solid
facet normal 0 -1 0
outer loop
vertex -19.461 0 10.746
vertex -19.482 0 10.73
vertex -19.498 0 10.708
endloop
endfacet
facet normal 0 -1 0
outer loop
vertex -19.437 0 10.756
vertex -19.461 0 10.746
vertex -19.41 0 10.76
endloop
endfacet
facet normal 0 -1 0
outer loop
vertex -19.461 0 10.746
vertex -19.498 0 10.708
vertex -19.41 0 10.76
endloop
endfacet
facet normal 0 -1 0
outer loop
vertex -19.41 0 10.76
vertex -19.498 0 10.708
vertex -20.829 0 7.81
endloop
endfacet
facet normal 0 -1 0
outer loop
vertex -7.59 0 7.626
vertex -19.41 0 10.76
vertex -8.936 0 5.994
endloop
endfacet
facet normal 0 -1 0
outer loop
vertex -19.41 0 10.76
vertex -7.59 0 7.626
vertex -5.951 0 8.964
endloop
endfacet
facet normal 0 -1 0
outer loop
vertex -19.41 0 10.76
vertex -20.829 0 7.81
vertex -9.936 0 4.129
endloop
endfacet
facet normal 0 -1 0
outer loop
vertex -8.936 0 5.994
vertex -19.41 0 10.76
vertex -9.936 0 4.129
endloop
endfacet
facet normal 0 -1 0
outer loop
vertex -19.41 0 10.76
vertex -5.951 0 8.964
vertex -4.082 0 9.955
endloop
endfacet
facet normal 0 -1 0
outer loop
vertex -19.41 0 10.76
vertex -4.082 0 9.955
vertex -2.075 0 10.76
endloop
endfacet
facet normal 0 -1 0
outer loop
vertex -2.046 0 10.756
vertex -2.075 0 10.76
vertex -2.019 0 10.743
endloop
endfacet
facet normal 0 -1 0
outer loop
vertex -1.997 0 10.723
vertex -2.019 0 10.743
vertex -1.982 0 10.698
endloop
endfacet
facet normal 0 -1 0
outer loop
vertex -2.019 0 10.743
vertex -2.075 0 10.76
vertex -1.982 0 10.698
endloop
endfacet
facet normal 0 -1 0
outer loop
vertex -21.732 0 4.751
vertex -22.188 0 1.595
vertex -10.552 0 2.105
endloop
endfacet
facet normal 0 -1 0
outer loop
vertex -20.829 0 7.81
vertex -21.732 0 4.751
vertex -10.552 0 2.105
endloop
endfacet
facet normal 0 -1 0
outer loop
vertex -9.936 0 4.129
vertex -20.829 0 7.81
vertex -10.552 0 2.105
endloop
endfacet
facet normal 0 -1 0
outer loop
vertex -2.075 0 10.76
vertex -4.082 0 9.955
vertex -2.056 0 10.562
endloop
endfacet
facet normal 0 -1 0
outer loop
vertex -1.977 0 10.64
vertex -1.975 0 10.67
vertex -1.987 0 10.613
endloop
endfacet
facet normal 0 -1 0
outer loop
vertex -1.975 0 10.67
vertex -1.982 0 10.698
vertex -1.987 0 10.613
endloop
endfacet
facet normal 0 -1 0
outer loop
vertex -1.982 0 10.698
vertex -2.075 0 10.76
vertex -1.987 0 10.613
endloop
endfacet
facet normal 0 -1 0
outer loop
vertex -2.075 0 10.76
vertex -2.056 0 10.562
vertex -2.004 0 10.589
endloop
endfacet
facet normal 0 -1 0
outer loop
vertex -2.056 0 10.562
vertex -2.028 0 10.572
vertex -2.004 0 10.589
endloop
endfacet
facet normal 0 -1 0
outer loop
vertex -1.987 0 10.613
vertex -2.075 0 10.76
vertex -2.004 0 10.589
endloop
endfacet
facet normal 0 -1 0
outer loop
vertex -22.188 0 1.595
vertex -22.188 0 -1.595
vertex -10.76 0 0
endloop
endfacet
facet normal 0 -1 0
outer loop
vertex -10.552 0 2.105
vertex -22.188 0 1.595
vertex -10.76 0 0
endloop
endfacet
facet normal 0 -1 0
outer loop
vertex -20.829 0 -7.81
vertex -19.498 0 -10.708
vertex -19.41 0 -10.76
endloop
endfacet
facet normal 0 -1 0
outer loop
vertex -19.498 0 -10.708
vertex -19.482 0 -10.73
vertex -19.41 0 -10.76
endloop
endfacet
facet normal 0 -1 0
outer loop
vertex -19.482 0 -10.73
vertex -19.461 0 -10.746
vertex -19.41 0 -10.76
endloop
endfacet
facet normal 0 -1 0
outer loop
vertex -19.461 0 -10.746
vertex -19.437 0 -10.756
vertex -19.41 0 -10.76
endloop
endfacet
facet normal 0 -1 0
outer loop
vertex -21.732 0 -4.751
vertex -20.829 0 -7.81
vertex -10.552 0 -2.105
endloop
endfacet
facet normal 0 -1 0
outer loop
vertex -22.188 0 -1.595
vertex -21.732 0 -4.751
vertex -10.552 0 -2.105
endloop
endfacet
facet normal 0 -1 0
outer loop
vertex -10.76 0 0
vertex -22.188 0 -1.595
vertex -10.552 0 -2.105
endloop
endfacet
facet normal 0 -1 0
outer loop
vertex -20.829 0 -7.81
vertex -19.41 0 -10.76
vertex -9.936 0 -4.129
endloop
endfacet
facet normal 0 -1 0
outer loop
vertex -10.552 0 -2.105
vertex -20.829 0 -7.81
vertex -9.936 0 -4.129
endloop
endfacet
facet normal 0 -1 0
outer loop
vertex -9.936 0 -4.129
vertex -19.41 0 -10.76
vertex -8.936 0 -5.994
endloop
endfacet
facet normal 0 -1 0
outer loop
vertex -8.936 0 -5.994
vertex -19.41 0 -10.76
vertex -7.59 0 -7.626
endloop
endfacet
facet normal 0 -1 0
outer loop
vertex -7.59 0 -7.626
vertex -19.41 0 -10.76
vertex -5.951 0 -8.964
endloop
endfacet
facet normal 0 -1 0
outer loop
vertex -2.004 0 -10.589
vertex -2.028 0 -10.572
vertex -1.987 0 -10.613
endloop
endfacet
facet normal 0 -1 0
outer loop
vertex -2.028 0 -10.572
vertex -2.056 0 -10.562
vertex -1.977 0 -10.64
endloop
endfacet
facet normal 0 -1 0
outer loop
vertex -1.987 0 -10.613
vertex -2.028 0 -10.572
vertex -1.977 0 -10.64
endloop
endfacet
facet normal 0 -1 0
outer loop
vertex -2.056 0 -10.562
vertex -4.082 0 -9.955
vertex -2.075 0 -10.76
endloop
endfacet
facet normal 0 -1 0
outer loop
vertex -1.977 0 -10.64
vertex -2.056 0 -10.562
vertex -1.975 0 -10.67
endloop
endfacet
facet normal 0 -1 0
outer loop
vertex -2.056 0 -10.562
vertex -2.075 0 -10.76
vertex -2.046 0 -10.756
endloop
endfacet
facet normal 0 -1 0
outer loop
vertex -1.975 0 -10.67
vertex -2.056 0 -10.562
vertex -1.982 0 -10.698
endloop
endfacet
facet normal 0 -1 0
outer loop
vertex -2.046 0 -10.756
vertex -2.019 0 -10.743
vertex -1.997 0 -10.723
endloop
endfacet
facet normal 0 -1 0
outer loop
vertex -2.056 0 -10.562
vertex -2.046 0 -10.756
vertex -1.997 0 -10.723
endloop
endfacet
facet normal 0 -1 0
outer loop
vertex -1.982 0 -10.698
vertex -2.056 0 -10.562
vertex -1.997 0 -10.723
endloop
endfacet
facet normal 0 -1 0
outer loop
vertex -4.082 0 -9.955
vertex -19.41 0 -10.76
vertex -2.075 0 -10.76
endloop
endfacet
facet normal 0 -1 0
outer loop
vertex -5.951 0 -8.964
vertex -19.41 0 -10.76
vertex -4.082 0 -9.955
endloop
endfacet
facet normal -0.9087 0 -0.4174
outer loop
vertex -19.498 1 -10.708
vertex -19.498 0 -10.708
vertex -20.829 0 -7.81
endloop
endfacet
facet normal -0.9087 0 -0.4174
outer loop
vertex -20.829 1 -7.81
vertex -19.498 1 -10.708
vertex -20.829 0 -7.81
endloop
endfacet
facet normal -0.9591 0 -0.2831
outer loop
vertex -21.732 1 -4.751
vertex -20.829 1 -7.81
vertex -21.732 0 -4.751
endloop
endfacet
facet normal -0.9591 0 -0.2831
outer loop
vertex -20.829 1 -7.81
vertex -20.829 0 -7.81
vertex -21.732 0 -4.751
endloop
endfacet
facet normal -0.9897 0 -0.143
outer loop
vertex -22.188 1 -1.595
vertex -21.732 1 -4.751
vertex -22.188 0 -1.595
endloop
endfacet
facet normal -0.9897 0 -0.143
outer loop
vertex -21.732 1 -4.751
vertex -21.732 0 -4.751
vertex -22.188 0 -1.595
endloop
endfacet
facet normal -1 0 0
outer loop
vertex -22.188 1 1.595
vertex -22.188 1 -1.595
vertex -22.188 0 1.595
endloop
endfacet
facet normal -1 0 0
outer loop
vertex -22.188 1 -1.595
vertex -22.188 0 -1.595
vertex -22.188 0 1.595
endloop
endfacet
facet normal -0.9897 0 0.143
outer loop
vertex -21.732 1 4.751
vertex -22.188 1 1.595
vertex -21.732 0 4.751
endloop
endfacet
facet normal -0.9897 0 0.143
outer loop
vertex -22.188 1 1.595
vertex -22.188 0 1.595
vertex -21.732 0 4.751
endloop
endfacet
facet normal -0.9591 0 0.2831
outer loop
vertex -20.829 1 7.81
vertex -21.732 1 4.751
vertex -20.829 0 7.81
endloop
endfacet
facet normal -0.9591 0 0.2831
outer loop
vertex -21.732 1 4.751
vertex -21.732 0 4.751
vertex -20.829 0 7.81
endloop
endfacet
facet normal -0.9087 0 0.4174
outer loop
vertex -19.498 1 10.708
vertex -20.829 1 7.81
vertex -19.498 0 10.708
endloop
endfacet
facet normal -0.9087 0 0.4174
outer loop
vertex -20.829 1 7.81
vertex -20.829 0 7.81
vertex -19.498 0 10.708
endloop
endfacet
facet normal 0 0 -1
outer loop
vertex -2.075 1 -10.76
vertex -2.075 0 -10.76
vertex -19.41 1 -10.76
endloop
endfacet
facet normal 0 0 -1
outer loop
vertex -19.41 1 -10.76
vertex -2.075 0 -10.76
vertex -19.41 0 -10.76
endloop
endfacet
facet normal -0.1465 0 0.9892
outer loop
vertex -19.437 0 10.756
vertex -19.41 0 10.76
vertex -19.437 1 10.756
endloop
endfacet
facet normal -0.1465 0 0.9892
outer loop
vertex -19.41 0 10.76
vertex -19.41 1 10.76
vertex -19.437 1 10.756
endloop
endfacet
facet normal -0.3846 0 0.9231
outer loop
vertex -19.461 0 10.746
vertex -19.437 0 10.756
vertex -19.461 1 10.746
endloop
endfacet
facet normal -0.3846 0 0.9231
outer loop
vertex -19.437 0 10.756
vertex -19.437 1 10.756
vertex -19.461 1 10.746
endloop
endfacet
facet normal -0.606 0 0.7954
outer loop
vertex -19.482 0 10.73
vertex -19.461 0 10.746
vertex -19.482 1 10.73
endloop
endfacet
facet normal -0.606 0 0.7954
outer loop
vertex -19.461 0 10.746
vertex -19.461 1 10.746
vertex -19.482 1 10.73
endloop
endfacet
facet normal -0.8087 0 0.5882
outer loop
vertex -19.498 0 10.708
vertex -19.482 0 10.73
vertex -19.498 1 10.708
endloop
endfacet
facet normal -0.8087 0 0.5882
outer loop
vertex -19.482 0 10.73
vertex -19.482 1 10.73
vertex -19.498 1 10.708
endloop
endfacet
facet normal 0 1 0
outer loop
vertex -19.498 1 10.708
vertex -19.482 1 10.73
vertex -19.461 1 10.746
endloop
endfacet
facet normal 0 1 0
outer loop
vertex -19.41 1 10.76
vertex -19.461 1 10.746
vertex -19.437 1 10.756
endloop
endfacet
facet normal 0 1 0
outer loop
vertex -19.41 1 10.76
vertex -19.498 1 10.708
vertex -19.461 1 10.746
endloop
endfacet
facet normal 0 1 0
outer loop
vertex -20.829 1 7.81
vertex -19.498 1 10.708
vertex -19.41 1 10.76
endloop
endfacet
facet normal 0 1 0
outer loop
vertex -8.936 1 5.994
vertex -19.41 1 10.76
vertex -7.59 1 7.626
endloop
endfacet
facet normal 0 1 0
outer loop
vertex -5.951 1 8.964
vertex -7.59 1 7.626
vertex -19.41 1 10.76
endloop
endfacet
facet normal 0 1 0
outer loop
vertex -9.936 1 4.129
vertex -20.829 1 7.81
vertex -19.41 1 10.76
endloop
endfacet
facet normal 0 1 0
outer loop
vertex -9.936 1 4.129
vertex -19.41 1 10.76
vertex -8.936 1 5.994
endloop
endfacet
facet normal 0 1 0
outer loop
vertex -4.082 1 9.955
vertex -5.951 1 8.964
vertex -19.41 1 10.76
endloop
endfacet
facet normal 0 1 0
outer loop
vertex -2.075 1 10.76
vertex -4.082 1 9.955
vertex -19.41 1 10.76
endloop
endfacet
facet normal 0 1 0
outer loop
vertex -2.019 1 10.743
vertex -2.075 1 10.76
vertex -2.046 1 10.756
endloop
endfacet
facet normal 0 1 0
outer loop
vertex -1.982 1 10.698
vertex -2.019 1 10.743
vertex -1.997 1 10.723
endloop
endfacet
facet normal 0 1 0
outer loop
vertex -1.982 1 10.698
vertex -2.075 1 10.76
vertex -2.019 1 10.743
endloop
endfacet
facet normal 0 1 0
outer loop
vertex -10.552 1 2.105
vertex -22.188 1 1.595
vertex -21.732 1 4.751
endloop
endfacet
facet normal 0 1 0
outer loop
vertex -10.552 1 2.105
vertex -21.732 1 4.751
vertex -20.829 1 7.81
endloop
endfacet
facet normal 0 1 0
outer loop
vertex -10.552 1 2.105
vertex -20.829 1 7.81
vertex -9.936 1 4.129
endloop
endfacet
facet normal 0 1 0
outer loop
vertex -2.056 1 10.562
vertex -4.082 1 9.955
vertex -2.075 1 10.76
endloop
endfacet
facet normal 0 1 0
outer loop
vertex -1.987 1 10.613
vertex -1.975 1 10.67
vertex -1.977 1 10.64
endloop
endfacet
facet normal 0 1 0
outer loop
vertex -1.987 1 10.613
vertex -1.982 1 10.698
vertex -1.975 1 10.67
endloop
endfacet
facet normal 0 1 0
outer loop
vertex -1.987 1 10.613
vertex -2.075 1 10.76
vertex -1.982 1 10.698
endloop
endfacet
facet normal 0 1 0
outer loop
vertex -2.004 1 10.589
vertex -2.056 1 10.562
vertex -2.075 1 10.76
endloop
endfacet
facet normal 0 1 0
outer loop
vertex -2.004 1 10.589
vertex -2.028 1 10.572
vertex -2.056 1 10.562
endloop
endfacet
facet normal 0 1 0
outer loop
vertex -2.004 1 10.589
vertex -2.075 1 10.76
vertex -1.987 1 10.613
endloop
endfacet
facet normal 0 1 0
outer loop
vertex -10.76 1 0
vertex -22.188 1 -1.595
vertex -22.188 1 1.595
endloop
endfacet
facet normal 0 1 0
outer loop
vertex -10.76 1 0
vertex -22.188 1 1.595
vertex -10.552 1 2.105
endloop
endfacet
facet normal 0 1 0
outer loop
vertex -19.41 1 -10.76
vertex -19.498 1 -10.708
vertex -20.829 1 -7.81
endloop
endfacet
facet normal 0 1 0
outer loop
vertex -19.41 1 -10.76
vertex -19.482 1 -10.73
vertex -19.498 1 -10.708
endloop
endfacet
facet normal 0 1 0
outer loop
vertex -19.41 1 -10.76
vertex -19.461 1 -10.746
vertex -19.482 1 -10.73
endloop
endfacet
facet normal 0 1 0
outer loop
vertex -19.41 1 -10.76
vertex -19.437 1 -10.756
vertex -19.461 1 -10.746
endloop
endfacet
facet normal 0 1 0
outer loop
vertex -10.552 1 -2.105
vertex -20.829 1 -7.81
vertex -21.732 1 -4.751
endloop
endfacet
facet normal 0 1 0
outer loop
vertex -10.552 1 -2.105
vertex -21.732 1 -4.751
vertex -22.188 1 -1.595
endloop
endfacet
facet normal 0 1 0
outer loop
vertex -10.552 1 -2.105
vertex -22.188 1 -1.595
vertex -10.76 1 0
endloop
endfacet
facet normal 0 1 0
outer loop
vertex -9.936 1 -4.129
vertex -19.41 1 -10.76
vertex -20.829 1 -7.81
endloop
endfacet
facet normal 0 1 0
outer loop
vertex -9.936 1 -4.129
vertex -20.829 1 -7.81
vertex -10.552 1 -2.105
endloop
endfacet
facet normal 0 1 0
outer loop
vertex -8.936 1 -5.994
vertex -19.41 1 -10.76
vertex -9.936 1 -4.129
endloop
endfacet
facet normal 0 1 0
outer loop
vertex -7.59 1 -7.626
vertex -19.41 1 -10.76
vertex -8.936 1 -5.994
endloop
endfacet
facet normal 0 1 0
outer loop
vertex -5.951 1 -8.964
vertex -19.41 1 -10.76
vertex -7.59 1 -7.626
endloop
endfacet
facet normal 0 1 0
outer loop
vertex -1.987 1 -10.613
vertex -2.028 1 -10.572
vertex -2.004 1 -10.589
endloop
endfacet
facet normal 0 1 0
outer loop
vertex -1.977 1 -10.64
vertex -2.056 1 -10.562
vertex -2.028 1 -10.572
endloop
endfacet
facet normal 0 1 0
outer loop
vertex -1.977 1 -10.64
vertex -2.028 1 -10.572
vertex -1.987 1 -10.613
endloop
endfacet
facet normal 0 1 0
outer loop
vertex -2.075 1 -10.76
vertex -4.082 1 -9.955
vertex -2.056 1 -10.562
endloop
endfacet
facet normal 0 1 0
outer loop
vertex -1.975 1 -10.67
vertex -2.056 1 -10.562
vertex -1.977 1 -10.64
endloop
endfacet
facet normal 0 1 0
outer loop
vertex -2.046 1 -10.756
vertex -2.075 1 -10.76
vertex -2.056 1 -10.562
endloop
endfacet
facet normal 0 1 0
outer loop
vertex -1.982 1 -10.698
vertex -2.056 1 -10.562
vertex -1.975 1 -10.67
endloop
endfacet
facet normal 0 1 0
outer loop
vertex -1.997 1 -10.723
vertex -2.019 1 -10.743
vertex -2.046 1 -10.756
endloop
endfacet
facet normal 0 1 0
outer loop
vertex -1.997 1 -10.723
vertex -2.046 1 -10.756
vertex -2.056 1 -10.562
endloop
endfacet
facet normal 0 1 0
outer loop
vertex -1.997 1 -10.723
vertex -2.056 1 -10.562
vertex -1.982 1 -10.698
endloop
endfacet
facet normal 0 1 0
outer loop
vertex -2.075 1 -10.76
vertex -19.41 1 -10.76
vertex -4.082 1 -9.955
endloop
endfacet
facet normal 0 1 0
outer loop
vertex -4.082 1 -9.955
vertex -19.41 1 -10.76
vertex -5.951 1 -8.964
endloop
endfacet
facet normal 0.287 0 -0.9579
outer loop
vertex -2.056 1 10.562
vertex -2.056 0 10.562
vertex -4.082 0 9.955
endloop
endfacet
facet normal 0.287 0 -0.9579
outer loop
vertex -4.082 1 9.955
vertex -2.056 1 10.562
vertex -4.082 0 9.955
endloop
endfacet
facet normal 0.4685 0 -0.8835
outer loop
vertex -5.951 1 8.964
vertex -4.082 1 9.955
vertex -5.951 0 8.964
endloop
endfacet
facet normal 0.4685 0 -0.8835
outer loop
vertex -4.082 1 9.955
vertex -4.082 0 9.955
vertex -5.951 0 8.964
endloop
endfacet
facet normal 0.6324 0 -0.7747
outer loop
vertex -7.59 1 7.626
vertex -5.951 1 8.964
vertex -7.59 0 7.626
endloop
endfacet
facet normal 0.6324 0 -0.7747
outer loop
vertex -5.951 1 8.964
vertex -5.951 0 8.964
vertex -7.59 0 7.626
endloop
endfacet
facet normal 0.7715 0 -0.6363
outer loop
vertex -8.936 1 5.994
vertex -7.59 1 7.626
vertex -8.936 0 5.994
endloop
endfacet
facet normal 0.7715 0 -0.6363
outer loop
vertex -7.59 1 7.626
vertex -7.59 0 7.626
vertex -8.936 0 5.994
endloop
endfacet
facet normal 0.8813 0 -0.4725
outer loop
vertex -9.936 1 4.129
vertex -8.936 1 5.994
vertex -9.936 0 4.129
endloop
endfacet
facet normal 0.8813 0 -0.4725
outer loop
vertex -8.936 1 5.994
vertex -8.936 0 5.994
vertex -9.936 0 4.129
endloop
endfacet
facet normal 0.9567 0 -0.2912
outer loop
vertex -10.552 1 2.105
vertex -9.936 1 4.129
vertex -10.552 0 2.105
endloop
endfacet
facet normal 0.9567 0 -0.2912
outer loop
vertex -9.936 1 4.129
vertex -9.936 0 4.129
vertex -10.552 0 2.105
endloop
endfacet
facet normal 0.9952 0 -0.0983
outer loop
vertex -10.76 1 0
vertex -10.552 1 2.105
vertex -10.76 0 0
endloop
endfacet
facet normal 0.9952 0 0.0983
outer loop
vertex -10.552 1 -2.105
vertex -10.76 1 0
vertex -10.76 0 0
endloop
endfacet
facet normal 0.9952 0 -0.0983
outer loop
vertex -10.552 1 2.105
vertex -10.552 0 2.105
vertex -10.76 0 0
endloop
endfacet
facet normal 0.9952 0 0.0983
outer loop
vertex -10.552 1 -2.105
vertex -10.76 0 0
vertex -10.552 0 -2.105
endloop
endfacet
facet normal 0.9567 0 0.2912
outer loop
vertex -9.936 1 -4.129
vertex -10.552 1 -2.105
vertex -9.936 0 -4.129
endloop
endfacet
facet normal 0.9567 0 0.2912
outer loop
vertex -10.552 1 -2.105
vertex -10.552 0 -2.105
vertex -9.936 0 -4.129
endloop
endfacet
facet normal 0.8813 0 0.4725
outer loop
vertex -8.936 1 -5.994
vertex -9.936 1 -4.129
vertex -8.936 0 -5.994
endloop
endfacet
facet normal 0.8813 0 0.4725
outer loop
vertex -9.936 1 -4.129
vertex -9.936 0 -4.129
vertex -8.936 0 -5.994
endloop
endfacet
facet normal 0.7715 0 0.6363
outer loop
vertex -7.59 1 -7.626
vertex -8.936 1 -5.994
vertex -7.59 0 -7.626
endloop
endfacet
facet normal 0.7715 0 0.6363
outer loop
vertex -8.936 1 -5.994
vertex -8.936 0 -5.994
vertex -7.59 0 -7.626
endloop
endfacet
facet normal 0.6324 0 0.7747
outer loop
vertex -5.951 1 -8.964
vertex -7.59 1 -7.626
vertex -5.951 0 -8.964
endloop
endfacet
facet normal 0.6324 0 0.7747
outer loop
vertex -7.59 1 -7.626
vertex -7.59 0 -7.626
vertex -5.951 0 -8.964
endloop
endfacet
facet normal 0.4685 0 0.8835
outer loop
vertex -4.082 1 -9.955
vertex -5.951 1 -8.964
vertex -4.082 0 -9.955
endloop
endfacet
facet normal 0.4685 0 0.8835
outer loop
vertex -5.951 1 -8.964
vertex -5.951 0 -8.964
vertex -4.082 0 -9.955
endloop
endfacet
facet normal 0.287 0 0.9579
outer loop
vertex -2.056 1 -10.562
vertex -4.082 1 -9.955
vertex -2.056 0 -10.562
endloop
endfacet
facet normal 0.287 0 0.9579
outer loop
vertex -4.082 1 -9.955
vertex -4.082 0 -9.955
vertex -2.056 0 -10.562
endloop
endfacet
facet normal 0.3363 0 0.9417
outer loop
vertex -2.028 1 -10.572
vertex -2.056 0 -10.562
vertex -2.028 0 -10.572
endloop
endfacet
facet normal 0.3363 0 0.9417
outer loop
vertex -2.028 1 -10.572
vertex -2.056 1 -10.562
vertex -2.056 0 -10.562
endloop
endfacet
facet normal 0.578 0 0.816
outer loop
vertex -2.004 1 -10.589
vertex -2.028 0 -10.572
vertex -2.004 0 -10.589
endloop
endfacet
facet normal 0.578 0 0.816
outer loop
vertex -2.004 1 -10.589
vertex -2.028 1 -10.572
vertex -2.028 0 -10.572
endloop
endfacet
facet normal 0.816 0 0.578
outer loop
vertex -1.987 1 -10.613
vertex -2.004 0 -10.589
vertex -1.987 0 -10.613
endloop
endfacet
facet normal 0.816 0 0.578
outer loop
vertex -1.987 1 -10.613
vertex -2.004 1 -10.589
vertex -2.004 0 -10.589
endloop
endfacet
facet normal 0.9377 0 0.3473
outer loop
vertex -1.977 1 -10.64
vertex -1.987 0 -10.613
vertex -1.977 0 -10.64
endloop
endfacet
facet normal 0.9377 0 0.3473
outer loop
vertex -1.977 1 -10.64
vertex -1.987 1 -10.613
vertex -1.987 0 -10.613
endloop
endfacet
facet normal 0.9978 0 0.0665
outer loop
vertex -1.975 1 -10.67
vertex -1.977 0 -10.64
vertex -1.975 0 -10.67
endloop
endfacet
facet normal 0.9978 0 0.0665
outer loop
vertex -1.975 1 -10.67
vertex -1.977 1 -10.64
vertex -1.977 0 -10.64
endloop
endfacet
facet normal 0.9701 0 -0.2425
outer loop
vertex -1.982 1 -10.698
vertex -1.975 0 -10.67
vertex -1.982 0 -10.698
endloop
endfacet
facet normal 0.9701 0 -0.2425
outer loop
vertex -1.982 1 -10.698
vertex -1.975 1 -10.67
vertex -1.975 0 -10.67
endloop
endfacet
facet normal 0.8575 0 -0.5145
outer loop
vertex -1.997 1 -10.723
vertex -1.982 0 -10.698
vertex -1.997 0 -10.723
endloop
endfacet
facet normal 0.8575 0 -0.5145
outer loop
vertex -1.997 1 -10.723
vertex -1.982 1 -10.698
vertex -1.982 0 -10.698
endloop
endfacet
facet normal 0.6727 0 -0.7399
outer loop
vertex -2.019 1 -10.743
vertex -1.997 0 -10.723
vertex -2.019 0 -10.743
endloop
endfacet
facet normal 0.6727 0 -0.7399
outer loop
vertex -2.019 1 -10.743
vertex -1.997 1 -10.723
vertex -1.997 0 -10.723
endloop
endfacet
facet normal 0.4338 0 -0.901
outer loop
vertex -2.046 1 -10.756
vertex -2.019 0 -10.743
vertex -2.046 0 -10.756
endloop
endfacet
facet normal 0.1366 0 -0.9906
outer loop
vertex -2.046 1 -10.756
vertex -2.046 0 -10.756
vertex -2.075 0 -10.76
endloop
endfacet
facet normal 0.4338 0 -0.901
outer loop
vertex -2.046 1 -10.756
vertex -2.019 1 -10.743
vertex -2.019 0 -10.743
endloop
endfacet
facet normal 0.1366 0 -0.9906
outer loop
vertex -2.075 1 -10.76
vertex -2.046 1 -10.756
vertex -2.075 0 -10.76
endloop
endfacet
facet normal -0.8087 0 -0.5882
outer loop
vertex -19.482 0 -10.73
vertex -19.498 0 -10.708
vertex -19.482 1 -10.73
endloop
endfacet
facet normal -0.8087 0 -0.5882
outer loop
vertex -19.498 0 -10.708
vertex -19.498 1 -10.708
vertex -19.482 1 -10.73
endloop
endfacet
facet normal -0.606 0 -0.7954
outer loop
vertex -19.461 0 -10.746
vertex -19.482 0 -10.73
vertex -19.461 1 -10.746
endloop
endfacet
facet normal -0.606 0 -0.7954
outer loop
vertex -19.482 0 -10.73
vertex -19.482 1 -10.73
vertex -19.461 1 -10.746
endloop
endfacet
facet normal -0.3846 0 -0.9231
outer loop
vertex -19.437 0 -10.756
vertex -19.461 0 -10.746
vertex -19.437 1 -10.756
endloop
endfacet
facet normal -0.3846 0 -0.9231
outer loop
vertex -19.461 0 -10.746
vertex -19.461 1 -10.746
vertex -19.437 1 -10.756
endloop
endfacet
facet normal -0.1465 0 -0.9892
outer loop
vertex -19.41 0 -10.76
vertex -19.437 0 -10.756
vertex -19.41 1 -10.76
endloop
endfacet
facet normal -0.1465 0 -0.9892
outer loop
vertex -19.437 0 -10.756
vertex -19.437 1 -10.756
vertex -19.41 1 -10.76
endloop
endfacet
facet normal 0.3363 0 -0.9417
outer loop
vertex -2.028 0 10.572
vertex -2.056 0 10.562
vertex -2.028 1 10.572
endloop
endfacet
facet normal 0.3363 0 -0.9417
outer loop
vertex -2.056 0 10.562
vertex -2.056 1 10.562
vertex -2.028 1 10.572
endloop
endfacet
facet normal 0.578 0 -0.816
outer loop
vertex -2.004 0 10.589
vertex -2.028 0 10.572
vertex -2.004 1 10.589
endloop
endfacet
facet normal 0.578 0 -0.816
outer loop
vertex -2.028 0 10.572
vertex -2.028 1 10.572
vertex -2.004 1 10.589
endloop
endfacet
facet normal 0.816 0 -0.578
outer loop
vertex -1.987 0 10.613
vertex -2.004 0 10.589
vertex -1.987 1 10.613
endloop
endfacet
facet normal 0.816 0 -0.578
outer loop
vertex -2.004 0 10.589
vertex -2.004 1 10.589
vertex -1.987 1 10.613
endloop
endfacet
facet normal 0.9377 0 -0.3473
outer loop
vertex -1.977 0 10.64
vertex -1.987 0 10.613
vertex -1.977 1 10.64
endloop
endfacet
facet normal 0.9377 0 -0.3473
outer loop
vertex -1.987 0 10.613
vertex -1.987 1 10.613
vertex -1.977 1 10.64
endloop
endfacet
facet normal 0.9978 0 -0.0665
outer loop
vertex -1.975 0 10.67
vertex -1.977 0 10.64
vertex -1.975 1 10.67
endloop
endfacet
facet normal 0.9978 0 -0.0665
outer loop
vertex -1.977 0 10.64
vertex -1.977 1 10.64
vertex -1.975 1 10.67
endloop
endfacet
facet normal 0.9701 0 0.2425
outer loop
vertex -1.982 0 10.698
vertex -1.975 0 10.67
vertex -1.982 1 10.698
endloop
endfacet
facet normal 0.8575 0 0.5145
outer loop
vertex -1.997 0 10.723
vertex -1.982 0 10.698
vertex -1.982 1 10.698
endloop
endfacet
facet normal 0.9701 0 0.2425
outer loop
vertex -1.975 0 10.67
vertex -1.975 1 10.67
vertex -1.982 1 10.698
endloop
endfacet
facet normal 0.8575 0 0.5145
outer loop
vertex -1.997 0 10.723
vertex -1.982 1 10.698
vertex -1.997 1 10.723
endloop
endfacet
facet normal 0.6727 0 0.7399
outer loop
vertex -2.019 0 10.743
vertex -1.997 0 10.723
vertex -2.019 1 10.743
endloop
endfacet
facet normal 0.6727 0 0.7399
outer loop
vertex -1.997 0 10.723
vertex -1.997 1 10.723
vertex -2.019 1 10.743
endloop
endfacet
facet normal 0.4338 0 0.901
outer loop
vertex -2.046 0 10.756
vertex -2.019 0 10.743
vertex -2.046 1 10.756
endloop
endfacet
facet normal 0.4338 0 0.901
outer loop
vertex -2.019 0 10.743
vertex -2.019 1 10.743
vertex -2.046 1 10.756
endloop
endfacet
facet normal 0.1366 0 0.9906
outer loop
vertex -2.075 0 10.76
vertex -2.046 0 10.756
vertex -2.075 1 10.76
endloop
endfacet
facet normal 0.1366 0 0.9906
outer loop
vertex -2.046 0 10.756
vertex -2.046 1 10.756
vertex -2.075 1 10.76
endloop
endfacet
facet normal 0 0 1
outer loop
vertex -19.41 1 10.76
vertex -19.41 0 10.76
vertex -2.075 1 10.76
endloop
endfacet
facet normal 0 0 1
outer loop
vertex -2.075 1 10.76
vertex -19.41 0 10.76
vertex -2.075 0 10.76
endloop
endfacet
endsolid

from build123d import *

# Parameters (mm, degrees)
BOSS_EXTRUDE1_DEPTH = 1
FILLET1_R           = 0.1
FILLET2_R           = 0.1
FILLET3_R           = 0.1
FILLET4_R           = 0.1


with BuildPart() as part:
    # Sketch1 → Boss-Extrude1 (new body)
    with BuildSketch(Plane(origin=(0, 0, 0), x_dir=(1, 0, 0), z_dir=(0, 1, 0))):
        with BuildLine():
            ThreePointArc((0, -10.76), (-10.76, 0), (0, 10.76))
            Line((0, 10.76), (-19.469525546, 10.76))
            ThreePointArc((-19.469525546, 10.76), (-22.245, 0), (-19.469525546, -10.76))
            Line((-19.469525546, -10.76), (0, -10.76))
        make_face()
    extrude(amount=BOSS_EXTRUDE1_DEPTH)

    # Fillet1
    fillet1_edges = [part.edges().sort_by_distance(p)[0] for p in [
        (0, 0.5, 10.76),
    ]]
    fillet(fillet1_edges, radius=FILLET1_R)

    # Fillet2
    fillet2_edges = [part.edges().sort_by_distance(p)[0] for p in [
        (0, 0.5, -10.76),
    ]]
    fillet(fillet2_edges, radius=FILLET2_R)

    # Fillet3
    fillet3_edges = [part.edges().sort_by_distance(p)[0] for p in [
        (-19.469525546, 0.5, 10.76),
    ]]
    fillet(fillet3_edges, radius=FILLET3_R)

    # Fillet4
    fillet4_edges = [part.edges().sort_by_distance(p)[0] for p in [
        (-19.469525546, 0.5, -10.76),
    ]]
    fillet(fillet4_edges, radius=FILLET4_R)


solid = part.part
